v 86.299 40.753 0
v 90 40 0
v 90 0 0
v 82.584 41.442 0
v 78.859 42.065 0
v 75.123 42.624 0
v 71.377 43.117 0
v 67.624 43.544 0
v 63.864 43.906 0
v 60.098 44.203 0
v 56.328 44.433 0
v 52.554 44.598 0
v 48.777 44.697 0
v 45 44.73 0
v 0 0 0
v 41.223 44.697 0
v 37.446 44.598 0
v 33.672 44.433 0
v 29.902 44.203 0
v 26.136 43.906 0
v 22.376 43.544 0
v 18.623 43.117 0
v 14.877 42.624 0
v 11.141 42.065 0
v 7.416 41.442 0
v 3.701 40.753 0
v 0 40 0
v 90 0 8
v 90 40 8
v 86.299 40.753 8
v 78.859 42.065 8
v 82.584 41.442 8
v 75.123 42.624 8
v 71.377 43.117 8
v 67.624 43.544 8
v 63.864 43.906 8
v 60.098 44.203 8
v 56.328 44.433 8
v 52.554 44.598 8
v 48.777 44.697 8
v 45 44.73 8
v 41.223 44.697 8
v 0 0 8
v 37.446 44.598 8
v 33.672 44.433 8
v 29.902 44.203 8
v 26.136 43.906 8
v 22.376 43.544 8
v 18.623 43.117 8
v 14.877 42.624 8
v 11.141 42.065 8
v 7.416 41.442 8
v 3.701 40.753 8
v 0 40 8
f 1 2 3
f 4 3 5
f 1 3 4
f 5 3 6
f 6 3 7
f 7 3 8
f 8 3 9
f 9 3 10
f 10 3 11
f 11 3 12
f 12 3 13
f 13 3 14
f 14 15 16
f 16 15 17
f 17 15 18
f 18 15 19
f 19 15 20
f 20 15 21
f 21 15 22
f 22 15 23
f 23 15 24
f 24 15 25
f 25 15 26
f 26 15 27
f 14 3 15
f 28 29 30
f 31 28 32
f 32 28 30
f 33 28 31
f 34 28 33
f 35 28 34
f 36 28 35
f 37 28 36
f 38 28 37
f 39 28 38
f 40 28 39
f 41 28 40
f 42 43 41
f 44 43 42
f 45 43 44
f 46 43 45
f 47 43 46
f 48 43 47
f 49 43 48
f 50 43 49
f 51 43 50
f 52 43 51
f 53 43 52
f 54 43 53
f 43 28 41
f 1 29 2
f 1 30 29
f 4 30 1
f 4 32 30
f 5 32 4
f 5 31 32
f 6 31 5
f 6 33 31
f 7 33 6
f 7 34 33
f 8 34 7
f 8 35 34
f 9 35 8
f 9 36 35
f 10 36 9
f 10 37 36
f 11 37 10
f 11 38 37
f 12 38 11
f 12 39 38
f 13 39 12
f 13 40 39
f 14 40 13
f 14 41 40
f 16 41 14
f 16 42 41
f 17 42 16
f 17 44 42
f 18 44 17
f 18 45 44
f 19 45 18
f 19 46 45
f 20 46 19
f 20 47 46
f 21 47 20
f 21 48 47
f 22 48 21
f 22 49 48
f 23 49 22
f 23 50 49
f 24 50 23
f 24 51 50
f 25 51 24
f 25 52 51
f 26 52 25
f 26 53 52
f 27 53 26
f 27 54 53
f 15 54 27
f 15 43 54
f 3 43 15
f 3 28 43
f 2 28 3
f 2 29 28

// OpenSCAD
$fn = 32;

// ----------------------------------------------------------------------
// Arc profile plate: crown, 27 points
// ----------------------------------------------------------------------

// --- parameters (mm) ---
bar_l = 90;               // bar length, X
bar_w = 40;               // bar height at the ends, Y
arc_r = 216.44;           // radius of the crown arc
arc_angle = 24;           // crown arc angle, degrees
crown_rise = 4.73;        // rise of the crown over the ends
arc_step = 1;             // sampling step of the crown arc, degrees
plate_t = 8;              // plate thickness, Z
fit_tol = 0.1;            // declared fit tolerance (prompt contract)
free_tol = 0.3;           // declared free tolerance (prompt contract)

bbox_y = bar_w + crown_rise;  // full height with the crown

profile = [[90, 40], [86.299, 40.753], [82.584, 41.442], [78.859, 42.065], [75.123, 42.624], [71.377, 43.117], [67.624, 43.544], [63.864, 43.906], [60.098, 44.203], [56.328, 44.433], [52.554, 44.598], [48.777, 44.697], [45, 44.73], [41.223, 44.697], [37.446, 44.598], [33.672, 44.433], [29.902, 44.203], [26.136, 43.906], [22.376, 43.544], [18.623, 43.117], [14.877, 42.624], [11.141, 42.065], [7.416, 41.442], [3.701, 40.753], [0, 40], [0, 0], [90, 0]];  // primary outline, 27 points, counter clockwise

// --- the one profile operation ---
linear_extrude(height = plate_t) polygon(points = profile);
